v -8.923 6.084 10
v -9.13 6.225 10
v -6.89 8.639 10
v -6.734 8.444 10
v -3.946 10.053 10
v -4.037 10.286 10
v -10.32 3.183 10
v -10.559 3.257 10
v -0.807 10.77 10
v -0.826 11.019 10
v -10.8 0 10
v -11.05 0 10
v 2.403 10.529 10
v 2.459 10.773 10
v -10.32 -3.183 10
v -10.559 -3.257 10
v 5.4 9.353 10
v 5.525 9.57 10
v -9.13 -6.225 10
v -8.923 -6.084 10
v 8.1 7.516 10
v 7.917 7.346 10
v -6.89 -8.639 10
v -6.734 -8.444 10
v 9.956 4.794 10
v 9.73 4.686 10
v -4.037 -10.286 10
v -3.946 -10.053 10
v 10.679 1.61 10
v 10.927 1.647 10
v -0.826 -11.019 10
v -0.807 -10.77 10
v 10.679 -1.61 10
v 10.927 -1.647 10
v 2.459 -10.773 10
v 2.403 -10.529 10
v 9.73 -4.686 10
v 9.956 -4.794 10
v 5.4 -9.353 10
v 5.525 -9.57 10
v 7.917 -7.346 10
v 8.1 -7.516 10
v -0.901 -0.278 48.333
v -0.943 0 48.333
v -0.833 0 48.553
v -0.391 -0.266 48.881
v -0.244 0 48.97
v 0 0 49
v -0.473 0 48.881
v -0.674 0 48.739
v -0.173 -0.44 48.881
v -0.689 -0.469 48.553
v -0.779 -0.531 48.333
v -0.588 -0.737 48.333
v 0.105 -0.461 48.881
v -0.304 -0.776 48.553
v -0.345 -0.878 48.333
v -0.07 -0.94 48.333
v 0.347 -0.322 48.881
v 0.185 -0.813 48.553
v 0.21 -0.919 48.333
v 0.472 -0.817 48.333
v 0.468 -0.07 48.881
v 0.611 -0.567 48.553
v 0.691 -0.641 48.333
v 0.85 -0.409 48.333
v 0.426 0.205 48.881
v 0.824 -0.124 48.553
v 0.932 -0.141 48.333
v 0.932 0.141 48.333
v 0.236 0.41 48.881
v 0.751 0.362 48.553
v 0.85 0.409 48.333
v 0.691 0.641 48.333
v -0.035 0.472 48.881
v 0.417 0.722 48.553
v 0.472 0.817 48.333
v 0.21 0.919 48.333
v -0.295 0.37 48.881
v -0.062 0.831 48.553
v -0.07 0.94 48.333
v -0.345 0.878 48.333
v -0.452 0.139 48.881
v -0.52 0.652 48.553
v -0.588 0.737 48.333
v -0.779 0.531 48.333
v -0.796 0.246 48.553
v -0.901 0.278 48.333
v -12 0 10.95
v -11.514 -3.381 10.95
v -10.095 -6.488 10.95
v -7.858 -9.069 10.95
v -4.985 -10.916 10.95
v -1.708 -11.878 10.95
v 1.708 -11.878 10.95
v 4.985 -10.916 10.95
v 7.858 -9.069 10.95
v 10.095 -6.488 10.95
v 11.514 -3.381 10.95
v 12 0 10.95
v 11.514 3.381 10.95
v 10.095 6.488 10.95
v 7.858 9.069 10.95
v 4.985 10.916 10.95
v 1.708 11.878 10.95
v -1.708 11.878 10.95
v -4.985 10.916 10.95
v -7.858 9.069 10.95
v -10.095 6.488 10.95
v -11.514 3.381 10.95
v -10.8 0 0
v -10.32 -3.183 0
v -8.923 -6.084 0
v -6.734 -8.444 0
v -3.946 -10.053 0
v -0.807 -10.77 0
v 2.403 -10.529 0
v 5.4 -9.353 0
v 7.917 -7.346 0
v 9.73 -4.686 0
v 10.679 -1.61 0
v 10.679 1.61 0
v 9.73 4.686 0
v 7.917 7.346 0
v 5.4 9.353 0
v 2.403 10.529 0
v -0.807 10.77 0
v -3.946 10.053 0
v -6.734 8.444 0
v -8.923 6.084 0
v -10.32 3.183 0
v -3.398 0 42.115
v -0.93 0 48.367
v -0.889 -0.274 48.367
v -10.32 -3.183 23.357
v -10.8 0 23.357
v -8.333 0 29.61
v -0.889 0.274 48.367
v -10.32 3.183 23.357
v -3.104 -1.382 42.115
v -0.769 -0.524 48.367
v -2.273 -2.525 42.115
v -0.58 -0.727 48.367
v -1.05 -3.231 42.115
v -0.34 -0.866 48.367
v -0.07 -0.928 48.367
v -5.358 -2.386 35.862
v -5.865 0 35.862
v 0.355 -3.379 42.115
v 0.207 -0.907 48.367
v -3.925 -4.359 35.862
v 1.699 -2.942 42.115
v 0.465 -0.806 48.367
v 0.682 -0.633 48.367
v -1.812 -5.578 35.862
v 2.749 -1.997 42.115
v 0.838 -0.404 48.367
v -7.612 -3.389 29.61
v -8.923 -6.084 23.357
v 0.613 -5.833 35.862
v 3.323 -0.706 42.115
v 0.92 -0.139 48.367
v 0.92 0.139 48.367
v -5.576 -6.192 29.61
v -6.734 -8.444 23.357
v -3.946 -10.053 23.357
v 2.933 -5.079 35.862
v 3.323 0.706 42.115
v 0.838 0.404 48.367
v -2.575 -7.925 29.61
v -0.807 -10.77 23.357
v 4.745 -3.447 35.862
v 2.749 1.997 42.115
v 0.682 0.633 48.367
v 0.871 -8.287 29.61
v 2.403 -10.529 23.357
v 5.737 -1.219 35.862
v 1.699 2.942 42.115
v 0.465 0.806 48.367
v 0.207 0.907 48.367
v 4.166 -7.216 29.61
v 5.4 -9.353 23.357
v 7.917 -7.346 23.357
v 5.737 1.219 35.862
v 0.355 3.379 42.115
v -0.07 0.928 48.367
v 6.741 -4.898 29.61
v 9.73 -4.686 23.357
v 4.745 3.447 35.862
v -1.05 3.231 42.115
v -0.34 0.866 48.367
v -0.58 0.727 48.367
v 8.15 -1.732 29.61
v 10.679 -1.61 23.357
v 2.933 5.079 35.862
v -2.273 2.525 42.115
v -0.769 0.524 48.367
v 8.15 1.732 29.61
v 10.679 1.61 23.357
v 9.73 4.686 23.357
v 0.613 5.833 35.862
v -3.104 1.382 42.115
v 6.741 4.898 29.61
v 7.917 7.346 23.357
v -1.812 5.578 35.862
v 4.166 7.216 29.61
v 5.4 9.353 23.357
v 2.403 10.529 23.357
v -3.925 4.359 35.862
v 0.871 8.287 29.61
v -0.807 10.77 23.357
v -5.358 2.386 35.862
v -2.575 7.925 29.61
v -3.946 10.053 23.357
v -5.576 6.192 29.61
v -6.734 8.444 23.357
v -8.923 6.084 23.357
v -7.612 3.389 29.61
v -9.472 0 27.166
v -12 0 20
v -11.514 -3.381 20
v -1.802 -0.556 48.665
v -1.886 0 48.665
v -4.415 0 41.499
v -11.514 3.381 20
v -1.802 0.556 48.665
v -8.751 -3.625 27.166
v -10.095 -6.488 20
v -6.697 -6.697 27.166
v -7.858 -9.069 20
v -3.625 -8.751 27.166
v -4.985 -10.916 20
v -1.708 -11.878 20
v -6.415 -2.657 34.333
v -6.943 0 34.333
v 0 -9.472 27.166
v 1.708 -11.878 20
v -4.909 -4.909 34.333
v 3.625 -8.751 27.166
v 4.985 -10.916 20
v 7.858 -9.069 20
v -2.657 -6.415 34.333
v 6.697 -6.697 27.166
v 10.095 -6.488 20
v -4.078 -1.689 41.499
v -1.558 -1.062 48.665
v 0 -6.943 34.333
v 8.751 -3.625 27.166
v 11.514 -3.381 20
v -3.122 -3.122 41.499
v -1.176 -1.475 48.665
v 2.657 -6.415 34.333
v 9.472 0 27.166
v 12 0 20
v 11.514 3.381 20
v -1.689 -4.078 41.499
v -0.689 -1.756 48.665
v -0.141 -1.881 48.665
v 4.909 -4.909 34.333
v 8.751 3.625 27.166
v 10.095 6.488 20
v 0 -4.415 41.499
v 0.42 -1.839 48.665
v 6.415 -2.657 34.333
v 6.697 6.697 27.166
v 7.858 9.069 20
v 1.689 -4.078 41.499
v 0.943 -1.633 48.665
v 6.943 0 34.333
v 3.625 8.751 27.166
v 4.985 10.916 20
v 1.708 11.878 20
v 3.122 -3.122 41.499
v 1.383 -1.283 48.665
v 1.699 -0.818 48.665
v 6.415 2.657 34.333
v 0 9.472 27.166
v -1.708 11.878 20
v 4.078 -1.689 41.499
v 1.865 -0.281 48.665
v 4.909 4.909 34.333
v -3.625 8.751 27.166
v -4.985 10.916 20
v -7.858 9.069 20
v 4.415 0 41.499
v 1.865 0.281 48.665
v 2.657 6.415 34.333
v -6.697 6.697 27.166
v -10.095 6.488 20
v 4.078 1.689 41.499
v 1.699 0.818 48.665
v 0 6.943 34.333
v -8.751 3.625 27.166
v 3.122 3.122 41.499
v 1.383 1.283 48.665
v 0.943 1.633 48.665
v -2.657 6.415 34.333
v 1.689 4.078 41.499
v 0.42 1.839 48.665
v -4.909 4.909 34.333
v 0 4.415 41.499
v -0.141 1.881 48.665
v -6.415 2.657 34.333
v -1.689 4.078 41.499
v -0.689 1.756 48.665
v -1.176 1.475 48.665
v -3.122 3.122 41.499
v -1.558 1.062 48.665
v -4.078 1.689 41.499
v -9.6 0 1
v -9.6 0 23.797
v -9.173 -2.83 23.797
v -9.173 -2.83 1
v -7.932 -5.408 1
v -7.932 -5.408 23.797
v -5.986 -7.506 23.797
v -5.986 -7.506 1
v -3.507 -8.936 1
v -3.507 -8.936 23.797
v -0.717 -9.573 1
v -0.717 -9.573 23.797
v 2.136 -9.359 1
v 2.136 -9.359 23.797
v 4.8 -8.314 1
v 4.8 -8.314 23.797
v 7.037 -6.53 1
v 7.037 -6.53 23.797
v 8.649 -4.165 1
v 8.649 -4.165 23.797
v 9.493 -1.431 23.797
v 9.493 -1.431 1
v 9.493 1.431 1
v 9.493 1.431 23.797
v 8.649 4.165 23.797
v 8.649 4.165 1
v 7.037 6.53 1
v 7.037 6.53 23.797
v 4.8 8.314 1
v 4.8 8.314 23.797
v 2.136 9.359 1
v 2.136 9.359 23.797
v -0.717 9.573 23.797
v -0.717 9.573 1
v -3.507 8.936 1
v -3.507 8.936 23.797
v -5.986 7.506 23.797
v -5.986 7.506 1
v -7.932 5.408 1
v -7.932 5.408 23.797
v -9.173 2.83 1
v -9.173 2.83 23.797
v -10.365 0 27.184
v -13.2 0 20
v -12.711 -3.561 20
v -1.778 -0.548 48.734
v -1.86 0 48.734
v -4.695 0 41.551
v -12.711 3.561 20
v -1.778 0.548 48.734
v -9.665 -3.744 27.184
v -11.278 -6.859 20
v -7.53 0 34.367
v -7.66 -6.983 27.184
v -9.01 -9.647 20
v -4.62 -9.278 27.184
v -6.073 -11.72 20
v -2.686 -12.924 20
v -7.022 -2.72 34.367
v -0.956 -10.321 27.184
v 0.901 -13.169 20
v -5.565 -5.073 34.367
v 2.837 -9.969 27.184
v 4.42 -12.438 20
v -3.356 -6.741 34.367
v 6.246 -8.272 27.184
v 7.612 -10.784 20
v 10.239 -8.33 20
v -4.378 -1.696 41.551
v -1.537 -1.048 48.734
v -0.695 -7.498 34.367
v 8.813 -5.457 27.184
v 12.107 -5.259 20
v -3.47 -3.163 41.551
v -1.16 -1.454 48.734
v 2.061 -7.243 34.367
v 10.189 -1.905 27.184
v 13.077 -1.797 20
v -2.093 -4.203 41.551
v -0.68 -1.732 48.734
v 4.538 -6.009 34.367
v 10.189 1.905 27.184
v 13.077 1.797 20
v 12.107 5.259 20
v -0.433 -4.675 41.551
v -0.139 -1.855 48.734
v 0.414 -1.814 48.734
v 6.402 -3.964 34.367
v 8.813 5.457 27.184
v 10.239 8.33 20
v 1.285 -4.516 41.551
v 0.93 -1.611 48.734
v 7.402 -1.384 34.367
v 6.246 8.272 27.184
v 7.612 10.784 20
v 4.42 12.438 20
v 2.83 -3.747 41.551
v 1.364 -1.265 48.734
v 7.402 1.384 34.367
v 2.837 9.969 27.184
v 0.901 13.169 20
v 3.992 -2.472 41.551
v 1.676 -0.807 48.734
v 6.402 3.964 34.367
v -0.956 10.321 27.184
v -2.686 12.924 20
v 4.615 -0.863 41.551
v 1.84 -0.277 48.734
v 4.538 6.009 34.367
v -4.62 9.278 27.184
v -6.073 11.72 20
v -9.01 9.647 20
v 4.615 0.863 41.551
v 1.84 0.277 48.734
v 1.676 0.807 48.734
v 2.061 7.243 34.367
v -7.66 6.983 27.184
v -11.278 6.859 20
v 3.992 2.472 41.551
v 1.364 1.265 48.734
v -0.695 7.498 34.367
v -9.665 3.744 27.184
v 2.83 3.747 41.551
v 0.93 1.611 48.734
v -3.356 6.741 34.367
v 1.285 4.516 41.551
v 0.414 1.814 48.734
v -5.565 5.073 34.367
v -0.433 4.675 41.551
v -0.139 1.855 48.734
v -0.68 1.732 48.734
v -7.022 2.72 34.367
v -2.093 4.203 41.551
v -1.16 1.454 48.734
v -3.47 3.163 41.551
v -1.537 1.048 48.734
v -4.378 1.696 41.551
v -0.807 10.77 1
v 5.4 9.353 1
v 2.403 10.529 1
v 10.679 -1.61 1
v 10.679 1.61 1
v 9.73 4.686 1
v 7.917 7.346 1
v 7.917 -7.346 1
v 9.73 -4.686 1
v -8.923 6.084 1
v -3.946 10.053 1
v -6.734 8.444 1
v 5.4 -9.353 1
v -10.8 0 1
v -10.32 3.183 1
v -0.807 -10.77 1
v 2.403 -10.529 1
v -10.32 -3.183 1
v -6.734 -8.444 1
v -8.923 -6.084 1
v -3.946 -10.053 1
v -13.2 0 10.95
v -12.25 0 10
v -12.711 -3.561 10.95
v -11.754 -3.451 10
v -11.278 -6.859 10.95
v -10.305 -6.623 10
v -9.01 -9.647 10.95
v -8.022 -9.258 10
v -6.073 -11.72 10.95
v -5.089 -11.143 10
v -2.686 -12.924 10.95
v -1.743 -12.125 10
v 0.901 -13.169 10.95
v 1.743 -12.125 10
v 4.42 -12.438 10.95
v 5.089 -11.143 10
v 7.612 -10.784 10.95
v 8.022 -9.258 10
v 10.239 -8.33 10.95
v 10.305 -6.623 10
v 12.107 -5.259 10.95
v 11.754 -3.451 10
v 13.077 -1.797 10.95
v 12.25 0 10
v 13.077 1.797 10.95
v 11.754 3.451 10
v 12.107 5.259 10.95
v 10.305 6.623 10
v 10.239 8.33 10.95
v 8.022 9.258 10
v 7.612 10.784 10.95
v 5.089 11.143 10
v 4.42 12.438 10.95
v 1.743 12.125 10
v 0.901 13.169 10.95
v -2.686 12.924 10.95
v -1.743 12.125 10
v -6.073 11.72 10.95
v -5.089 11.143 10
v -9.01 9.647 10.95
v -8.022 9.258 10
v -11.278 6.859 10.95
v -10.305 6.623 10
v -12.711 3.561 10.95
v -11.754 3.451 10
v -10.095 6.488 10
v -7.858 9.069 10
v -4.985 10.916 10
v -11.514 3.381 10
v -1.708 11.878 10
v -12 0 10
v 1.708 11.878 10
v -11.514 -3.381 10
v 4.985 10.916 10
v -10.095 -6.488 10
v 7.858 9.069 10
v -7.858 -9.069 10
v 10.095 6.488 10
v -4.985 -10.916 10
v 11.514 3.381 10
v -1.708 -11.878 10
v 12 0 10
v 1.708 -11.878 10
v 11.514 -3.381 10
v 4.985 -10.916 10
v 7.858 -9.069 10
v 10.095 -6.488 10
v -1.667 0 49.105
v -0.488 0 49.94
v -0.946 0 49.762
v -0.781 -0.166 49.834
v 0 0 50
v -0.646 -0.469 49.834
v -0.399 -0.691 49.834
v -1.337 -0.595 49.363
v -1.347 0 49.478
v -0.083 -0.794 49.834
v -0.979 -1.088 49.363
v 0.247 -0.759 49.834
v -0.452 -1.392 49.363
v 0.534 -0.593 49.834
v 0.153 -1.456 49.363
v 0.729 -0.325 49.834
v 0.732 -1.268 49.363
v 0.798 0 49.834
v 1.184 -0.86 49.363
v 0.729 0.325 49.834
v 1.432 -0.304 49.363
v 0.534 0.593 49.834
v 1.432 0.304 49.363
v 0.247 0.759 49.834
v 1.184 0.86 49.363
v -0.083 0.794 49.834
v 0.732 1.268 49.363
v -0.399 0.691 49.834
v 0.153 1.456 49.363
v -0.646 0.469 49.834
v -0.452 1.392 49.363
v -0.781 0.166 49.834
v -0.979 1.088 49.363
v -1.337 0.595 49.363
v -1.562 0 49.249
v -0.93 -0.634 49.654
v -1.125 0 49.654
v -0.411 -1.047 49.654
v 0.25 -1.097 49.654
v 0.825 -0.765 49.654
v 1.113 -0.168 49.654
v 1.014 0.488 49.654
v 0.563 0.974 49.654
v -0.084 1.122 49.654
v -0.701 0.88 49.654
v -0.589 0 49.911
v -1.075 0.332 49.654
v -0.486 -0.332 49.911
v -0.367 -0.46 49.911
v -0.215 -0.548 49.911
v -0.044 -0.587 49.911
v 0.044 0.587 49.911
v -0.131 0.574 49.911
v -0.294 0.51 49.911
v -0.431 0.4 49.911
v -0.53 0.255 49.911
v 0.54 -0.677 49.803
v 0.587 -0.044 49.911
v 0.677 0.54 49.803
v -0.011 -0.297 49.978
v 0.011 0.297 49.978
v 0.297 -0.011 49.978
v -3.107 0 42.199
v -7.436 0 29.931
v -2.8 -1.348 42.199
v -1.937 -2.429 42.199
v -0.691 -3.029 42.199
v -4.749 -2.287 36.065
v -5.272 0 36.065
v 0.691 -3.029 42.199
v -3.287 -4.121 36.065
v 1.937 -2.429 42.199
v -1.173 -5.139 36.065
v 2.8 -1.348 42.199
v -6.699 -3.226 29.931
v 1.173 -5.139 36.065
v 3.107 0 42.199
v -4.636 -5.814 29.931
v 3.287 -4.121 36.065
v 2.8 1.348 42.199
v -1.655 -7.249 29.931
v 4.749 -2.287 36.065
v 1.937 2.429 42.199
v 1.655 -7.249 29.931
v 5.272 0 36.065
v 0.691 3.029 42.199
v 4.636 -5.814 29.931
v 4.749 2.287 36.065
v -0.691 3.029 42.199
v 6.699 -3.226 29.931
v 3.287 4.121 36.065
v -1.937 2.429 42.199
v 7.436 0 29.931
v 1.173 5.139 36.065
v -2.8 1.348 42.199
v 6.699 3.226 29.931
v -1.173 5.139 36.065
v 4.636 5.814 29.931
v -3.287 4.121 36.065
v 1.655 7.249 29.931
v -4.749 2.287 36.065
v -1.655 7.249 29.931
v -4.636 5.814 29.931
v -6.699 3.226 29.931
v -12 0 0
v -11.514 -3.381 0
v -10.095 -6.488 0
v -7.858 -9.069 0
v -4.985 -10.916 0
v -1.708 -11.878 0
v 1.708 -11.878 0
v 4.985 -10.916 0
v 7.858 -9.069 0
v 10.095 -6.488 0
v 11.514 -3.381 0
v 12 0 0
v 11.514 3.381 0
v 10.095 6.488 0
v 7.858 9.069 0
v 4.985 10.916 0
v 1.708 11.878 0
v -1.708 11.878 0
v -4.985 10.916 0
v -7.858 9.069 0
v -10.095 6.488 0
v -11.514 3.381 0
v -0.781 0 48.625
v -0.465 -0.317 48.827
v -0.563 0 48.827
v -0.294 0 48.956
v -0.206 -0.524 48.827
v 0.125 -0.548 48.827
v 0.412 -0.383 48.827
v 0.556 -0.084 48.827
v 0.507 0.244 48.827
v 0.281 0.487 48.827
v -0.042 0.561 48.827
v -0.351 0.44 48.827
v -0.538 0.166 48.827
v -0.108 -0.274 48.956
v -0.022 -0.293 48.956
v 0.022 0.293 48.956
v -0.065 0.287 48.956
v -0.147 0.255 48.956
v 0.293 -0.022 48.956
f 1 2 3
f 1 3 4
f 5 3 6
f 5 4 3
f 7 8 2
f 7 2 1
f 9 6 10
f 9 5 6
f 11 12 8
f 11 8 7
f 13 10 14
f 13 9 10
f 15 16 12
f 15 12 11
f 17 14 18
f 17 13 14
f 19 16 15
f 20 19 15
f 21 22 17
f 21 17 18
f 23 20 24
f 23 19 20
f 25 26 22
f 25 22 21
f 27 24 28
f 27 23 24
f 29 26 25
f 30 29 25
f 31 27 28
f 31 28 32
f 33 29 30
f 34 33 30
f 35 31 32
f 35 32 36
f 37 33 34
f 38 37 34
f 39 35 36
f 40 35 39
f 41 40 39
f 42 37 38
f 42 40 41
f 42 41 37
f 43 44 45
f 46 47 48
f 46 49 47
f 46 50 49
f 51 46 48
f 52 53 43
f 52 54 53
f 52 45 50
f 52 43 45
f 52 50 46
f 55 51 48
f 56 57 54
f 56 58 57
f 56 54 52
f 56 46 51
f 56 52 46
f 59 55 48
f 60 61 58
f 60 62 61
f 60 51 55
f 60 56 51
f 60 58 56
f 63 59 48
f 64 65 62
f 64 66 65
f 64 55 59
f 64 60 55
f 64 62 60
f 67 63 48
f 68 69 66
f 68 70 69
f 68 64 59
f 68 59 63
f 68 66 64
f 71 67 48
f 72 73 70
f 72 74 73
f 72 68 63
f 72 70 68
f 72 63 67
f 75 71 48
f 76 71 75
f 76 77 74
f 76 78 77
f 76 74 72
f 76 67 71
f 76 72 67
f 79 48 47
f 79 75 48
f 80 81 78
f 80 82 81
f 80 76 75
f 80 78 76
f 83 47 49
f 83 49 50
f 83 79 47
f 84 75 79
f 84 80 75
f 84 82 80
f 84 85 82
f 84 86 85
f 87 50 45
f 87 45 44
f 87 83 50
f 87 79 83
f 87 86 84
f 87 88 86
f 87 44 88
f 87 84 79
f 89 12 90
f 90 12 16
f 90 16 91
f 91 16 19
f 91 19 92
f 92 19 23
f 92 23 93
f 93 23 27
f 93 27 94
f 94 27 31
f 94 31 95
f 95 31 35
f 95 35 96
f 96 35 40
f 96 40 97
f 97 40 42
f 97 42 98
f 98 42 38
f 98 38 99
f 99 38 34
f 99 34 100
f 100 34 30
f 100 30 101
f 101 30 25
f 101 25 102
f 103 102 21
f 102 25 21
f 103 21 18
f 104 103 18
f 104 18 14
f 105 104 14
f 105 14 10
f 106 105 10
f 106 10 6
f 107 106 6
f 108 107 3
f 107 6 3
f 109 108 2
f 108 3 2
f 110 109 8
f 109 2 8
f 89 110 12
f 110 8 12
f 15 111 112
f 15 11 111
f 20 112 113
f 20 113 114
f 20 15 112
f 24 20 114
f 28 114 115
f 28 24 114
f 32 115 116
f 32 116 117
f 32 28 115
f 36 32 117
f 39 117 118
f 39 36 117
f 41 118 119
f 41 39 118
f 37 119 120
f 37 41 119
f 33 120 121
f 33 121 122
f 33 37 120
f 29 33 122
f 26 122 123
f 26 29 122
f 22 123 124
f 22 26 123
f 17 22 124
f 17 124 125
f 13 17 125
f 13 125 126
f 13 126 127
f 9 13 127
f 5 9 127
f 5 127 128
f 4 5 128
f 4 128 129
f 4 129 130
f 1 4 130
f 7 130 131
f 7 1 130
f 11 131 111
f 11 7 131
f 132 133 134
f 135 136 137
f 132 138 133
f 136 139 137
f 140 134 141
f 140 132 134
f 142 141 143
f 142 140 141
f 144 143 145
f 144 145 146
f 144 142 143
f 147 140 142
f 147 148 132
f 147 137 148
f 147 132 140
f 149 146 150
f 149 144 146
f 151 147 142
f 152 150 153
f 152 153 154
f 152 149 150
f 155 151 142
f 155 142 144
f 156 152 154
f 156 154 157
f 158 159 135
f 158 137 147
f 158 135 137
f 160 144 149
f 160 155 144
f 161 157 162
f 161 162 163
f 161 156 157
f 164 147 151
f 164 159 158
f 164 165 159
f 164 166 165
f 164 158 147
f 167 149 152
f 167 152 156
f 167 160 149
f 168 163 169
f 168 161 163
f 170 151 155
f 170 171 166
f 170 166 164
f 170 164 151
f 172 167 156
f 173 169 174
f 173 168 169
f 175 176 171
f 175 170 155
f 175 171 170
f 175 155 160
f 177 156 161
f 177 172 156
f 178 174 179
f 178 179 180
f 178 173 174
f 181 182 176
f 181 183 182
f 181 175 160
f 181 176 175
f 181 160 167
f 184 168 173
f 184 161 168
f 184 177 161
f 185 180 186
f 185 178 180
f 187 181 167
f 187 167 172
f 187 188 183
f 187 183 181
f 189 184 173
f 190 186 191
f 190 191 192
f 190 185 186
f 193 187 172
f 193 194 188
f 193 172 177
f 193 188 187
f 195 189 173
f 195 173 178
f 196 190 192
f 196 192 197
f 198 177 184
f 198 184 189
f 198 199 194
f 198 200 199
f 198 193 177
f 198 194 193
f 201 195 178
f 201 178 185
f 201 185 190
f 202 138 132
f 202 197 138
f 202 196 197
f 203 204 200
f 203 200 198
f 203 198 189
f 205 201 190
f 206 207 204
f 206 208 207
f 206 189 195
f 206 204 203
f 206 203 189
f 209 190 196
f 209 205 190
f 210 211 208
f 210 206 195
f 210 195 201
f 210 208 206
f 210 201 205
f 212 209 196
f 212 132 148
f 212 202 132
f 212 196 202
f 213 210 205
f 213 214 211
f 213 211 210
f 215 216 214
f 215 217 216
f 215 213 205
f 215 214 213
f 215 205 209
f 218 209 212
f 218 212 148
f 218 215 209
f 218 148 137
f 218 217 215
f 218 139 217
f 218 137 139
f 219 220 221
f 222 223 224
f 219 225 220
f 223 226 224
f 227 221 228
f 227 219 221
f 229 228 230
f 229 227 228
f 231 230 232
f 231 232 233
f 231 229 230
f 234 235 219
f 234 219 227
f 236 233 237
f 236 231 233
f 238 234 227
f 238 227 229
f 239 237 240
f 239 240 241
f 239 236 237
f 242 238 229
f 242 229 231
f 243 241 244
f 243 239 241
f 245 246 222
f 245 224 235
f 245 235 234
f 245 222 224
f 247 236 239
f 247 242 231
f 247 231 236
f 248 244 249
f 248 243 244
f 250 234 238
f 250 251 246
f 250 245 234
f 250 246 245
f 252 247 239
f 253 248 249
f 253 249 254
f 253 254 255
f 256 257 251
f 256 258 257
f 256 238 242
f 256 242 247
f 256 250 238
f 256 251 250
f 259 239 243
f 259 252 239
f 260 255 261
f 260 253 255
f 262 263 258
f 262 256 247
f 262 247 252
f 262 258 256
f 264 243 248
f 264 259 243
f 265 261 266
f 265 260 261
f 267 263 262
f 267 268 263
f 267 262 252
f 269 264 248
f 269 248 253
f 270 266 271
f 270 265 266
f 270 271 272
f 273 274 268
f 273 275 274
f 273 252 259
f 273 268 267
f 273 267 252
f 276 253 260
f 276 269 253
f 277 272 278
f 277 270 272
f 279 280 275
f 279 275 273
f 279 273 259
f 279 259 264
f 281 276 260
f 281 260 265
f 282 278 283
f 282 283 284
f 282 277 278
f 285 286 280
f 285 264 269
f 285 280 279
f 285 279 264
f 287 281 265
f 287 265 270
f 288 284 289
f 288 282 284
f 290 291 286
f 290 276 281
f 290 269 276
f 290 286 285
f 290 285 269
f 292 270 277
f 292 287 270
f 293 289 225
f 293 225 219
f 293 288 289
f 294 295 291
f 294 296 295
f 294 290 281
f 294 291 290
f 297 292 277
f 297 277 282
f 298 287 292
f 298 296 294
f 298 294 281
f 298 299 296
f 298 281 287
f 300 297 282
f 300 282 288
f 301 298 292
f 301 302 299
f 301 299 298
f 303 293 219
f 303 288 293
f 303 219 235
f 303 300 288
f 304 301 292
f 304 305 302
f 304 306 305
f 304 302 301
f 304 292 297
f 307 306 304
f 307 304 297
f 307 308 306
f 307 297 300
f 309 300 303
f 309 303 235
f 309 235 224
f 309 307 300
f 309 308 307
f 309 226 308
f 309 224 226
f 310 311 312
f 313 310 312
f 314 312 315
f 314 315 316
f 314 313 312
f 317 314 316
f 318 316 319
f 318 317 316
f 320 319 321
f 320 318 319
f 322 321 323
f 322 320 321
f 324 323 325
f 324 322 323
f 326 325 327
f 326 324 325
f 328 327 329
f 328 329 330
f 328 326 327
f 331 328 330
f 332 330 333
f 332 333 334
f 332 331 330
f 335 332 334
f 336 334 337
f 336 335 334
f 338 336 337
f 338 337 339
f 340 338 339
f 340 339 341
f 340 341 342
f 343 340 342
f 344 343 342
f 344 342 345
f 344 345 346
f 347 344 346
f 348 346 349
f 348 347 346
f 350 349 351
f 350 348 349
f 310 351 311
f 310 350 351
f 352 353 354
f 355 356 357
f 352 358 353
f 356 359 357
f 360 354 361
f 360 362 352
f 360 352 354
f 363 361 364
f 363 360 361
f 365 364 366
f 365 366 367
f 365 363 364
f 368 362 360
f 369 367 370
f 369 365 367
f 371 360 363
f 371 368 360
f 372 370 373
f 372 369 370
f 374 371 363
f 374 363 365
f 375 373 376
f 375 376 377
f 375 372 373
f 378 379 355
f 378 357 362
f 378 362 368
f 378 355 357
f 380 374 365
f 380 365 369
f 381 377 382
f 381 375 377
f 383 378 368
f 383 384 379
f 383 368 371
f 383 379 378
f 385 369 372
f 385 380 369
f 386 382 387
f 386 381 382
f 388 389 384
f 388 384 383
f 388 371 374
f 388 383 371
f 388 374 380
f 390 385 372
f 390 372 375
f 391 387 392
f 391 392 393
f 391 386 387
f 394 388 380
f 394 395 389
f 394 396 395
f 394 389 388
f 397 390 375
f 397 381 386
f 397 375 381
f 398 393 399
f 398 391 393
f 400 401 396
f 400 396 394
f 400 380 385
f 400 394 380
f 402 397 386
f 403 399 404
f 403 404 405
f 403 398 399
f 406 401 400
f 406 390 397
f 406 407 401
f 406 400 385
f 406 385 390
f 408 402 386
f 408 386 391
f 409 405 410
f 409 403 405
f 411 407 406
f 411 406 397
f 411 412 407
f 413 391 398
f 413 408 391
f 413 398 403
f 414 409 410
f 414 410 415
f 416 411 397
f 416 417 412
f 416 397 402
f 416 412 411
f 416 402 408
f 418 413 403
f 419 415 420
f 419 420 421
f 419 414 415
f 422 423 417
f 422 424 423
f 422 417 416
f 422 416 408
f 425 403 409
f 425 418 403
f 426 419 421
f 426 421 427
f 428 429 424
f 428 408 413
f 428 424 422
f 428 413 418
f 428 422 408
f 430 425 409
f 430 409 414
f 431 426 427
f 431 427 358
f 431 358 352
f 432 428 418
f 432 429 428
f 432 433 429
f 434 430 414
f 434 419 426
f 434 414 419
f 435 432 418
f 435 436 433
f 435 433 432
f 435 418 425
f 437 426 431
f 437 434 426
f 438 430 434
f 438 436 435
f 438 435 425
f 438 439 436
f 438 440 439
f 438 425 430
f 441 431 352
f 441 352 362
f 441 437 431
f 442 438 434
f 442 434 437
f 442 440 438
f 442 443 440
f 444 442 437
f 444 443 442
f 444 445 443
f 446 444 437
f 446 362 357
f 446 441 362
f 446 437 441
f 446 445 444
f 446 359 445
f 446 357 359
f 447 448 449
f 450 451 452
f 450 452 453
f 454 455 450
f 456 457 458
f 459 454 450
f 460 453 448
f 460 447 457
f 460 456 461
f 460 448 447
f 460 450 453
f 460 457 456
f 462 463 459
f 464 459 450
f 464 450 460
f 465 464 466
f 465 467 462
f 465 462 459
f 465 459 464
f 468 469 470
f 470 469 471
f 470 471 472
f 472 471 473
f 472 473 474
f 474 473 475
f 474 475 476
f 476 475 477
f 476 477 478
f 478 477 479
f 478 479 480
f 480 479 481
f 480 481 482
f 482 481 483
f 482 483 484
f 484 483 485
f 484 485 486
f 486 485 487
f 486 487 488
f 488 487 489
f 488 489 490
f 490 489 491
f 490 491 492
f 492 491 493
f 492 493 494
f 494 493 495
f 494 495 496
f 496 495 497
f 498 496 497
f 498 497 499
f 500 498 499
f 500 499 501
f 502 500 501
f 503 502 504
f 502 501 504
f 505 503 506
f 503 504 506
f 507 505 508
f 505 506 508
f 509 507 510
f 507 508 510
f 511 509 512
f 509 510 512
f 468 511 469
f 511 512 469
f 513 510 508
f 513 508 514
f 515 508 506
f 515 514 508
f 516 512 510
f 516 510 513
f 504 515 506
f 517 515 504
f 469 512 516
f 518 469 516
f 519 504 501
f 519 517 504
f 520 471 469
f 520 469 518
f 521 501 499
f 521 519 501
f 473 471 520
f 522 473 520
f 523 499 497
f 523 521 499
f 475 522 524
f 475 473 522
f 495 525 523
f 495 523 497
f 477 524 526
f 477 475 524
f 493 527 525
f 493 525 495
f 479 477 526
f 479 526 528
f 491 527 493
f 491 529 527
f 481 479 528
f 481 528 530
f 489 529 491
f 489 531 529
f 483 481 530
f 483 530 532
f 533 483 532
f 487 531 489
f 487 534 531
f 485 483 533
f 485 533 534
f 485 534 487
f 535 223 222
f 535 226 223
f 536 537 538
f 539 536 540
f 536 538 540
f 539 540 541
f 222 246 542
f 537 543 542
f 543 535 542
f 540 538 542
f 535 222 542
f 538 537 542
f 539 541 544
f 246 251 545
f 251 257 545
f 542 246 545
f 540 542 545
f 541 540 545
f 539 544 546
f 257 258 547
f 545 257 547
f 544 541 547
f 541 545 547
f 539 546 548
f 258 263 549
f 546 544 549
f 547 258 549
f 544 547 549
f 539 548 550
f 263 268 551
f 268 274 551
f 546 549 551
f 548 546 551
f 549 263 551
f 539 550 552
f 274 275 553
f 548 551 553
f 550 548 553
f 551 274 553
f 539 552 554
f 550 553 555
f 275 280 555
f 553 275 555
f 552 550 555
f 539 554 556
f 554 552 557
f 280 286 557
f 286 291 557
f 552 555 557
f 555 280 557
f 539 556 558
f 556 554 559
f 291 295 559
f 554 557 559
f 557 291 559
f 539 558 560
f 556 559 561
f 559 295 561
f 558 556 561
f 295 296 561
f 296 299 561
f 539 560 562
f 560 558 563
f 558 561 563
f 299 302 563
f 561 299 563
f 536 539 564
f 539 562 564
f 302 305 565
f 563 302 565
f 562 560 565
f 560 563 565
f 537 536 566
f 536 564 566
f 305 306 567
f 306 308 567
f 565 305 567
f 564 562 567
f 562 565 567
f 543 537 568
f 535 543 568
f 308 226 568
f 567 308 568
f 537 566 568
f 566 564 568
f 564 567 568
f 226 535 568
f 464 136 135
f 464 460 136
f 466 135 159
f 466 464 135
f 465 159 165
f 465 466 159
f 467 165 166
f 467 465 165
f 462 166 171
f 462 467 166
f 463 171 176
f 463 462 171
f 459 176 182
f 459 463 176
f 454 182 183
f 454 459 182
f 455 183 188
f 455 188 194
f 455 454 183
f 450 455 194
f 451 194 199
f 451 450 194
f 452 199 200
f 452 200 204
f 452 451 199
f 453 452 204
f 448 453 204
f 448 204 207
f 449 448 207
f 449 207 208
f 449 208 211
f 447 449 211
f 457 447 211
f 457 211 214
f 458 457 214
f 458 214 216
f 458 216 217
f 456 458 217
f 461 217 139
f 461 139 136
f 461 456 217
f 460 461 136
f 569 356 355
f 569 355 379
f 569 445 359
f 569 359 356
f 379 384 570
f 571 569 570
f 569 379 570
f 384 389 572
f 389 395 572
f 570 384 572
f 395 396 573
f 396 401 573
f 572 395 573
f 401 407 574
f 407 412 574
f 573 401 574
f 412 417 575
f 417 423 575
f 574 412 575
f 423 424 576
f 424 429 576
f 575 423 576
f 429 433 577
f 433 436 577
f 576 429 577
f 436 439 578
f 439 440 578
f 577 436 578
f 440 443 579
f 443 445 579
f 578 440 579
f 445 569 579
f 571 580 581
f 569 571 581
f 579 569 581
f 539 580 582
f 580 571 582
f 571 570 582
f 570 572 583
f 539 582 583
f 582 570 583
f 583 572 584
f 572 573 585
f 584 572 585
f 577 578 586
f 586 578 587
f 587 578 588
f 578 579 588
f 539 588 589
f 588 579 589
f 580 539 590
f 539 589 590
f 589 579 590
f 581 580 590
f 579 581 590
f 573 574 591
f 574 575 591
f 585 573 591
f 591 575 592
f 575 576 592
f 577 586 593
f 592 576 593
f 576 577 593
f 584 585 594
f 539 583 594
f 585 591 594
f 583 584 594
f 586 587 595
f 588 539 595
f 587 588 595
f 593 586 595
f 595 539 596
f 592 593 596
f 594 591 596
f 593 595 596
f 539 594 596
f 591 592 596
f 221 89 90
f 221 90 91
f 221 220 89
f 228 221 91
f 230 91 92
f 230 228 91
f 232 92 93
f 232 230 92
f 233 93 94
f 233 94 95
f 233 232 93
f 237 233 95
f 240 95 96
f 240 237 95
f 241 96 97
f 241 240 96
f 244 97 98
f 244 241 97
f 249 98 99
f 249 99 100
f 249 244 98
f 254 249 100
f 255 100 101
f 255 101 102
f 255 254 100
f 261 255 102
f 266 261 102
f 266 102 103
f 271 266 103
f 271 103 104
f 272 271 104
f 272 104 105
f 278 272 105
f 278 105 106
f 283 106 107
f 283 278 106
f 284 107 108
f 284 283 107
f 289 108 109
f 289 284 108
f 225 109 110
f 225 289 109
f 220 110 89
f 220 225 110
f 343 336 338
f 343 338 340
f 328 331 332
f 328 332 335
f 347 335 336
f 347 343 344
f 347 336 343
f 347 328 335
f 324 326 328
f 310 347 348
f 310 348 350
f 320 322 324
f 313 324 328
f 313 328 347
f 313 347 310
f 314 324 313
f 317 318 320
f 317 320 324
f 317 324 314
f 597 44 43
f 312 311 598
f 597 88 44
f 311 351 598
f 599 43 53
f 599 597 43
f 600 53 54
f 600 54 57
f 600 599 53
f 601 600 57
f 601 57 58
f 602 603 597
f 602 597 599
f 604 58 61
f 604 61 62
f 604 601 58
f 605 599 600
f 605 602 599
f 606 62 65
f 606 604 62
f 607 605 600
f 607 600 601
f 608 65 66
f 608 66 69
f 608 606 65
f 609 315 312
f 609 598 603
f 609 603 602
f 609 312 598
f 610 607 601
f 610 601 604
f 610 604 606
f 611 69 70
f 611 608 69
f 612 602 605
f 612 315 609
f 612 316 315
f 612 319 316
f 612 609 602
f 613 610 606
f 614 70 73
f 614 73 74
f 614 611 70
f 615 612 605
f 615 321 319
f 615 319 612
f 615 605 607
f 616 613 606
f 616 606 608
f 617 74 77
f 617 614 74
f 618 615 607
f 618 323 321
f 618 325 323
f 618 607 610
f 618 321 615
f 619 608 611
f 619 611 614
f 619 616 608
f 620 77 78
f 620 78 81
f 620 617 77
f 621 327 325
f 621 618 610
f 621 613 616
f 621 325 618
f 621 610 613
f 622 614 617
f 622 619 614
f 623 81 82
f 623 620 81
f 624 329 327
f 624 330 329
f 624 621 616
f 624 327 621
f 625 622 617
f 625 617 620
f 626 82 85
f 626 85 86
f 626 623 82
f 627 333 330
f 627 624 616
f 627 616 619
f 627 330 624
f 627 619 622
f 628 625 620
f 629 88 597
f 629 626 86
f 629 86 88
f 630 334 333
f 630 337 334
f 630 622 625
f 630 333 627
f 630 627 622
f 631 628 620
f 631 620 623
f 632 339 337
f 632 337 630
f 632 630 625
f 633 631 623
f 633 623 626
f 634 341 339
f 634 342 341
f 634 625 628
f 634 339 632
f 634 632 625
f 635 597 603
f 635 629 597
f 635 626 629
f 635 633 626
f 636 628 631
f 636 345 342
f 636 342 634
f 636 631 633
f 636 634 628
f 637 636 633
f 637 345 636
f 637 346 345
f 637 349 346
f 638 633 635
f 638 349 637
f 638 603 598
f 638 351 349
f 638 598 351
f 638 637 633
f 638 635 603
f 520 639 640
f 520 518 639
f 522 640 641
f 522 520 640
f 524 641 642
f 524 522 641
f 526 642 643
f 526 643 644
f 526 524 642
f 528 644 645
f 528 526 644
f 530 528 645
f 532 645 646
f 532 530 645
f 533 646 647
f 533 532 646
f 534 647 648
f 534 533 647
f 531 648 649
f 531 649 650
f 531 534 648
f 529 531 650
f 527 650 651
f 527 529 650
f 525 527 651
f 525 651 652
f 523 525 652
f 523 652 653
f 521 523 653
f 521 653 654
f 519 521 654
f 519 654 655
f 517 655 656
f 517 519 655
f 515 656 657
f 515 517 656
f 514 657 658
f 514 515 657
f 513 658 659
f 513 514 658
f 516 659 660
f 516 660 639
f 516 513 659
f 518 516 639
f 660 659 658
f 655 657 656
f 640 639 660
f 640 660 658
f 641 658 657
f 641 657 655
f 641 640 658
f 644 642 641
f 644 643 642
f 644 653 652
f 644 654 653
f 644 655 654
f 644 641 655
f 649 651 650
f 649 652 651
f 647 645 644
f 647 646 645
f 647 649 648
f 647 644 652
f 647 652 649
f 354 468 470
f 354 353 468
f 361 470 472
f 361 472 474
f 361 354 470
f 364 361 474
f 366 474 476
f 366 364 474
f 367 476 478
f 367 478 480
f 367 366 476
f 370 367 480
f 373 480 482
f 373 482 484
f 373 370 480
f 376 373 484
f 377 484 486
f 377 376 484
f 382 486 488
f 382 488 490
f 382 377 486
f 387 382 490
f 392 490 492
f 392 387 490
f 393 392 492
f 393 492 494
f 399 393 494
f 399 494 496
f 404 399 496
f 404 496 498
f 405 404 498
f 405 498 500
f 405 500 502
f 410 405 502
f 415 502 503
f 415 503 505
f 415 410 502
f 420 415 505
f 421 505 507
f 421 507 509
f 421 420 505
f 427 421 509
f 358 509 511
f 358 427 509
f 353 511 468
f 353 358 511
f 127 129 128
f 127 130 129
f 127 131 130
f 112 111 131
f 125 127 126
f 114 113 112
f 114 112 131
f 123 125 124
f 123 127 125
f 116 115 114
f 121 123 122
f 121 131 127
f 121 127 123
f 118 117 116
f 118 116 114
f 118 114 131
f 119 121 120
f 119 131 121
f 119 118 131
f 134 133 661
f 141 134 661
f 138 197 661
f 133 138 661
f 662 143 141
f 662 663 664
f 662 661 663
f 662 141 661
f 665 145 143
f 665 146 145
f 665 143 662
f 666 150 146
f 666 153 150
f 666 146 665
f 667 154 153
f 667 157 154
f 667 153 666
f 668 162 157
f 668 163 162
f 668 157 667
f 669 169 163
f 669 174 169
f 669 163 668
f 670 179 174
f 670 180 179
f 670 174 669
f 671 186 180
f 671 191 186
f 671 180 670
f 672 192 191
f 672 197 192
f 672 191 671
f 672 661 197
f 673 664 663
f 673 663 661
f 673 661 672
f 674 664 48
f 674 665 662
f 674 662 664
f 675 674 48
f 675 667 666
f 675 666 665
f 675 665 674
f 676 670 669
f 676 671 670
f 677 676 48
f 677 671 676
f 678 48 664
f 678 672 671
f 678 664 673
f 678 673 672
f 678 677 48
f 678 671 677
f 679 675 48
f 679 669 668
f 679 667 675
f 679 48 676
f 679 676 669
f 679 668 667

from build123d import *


with BuildPart() as body:
    # Sketch → Revolution (revolve)
    with BuildSketch(Plane.XZ):
        with BuildLine():
            Line((-10.8, 0), (-10.8, 10))
            Line((-10.8, 10), (-11.05, 10))
            Line((-12, 10.95), (-11.05, 10))
            Line((-12, 10.95), (-12, 20))
            Line((-12, 20), (-1.886048, 48.665449))
            ThreePointArc((0, 50), (-1.155228, 49.63262), (-1.886048, 48.665449))
            Line((0, 50), (0, 49))
            ThreePointArc((0, 49), (-0.577614, 48.81631), (-0.943024, 48.332725))
            Line((-0.943024, 48.332725), (-9.6, 23.796707))
            Line((-9.6, 23.796707), (-9.6, 1))
            Line((-9.6, 1), (0, 1))
            Line((0, 1), (0, 0))
            Line((0, 0), (-10.8, 0))
        make_face()
    revolve(axis=Axis((0, 0, 0), (0, 0, 1)))


with BuildPart() as body001:
    # Sketch001 → Revolution001 (revolve)
    with BuildSketch(Plane.XZ):
        with BuildLine():
            Line((-12, 0), (-12, 10))
            Line((-12, 10), (-12.25, 10))
            Line((-13.2, 10.95), (-12.25, 10))
            Line((-13.2, 10.95), (-13.2, 20))
            Line((-13.2, 20), (-1.860373, 48.734176))
            ThreePointArc((0, 50), (-1.125089, 49.653534), (-1.860373, 48.734176))
            Line((0, 50), (0, 49))
            ThreePointArc((0, 49), (-0.562544, 48.826767), (-0.930186, 48.367088))
            Line((-0.930186, 48.367088), (-10.8, 23.357363))
            Line((-10.8, 23.357363), (-10.8, 1))
            Line((-10.8, 1), (0, 1))
            Line((0, 1), (0, 0))
            Line((0, 0), (-12, 0))
        make_face()
    revolve(axis=Axis((0, 0, 0), (0, 0, 1)))


solid = Compound([body.part, body001.part])
